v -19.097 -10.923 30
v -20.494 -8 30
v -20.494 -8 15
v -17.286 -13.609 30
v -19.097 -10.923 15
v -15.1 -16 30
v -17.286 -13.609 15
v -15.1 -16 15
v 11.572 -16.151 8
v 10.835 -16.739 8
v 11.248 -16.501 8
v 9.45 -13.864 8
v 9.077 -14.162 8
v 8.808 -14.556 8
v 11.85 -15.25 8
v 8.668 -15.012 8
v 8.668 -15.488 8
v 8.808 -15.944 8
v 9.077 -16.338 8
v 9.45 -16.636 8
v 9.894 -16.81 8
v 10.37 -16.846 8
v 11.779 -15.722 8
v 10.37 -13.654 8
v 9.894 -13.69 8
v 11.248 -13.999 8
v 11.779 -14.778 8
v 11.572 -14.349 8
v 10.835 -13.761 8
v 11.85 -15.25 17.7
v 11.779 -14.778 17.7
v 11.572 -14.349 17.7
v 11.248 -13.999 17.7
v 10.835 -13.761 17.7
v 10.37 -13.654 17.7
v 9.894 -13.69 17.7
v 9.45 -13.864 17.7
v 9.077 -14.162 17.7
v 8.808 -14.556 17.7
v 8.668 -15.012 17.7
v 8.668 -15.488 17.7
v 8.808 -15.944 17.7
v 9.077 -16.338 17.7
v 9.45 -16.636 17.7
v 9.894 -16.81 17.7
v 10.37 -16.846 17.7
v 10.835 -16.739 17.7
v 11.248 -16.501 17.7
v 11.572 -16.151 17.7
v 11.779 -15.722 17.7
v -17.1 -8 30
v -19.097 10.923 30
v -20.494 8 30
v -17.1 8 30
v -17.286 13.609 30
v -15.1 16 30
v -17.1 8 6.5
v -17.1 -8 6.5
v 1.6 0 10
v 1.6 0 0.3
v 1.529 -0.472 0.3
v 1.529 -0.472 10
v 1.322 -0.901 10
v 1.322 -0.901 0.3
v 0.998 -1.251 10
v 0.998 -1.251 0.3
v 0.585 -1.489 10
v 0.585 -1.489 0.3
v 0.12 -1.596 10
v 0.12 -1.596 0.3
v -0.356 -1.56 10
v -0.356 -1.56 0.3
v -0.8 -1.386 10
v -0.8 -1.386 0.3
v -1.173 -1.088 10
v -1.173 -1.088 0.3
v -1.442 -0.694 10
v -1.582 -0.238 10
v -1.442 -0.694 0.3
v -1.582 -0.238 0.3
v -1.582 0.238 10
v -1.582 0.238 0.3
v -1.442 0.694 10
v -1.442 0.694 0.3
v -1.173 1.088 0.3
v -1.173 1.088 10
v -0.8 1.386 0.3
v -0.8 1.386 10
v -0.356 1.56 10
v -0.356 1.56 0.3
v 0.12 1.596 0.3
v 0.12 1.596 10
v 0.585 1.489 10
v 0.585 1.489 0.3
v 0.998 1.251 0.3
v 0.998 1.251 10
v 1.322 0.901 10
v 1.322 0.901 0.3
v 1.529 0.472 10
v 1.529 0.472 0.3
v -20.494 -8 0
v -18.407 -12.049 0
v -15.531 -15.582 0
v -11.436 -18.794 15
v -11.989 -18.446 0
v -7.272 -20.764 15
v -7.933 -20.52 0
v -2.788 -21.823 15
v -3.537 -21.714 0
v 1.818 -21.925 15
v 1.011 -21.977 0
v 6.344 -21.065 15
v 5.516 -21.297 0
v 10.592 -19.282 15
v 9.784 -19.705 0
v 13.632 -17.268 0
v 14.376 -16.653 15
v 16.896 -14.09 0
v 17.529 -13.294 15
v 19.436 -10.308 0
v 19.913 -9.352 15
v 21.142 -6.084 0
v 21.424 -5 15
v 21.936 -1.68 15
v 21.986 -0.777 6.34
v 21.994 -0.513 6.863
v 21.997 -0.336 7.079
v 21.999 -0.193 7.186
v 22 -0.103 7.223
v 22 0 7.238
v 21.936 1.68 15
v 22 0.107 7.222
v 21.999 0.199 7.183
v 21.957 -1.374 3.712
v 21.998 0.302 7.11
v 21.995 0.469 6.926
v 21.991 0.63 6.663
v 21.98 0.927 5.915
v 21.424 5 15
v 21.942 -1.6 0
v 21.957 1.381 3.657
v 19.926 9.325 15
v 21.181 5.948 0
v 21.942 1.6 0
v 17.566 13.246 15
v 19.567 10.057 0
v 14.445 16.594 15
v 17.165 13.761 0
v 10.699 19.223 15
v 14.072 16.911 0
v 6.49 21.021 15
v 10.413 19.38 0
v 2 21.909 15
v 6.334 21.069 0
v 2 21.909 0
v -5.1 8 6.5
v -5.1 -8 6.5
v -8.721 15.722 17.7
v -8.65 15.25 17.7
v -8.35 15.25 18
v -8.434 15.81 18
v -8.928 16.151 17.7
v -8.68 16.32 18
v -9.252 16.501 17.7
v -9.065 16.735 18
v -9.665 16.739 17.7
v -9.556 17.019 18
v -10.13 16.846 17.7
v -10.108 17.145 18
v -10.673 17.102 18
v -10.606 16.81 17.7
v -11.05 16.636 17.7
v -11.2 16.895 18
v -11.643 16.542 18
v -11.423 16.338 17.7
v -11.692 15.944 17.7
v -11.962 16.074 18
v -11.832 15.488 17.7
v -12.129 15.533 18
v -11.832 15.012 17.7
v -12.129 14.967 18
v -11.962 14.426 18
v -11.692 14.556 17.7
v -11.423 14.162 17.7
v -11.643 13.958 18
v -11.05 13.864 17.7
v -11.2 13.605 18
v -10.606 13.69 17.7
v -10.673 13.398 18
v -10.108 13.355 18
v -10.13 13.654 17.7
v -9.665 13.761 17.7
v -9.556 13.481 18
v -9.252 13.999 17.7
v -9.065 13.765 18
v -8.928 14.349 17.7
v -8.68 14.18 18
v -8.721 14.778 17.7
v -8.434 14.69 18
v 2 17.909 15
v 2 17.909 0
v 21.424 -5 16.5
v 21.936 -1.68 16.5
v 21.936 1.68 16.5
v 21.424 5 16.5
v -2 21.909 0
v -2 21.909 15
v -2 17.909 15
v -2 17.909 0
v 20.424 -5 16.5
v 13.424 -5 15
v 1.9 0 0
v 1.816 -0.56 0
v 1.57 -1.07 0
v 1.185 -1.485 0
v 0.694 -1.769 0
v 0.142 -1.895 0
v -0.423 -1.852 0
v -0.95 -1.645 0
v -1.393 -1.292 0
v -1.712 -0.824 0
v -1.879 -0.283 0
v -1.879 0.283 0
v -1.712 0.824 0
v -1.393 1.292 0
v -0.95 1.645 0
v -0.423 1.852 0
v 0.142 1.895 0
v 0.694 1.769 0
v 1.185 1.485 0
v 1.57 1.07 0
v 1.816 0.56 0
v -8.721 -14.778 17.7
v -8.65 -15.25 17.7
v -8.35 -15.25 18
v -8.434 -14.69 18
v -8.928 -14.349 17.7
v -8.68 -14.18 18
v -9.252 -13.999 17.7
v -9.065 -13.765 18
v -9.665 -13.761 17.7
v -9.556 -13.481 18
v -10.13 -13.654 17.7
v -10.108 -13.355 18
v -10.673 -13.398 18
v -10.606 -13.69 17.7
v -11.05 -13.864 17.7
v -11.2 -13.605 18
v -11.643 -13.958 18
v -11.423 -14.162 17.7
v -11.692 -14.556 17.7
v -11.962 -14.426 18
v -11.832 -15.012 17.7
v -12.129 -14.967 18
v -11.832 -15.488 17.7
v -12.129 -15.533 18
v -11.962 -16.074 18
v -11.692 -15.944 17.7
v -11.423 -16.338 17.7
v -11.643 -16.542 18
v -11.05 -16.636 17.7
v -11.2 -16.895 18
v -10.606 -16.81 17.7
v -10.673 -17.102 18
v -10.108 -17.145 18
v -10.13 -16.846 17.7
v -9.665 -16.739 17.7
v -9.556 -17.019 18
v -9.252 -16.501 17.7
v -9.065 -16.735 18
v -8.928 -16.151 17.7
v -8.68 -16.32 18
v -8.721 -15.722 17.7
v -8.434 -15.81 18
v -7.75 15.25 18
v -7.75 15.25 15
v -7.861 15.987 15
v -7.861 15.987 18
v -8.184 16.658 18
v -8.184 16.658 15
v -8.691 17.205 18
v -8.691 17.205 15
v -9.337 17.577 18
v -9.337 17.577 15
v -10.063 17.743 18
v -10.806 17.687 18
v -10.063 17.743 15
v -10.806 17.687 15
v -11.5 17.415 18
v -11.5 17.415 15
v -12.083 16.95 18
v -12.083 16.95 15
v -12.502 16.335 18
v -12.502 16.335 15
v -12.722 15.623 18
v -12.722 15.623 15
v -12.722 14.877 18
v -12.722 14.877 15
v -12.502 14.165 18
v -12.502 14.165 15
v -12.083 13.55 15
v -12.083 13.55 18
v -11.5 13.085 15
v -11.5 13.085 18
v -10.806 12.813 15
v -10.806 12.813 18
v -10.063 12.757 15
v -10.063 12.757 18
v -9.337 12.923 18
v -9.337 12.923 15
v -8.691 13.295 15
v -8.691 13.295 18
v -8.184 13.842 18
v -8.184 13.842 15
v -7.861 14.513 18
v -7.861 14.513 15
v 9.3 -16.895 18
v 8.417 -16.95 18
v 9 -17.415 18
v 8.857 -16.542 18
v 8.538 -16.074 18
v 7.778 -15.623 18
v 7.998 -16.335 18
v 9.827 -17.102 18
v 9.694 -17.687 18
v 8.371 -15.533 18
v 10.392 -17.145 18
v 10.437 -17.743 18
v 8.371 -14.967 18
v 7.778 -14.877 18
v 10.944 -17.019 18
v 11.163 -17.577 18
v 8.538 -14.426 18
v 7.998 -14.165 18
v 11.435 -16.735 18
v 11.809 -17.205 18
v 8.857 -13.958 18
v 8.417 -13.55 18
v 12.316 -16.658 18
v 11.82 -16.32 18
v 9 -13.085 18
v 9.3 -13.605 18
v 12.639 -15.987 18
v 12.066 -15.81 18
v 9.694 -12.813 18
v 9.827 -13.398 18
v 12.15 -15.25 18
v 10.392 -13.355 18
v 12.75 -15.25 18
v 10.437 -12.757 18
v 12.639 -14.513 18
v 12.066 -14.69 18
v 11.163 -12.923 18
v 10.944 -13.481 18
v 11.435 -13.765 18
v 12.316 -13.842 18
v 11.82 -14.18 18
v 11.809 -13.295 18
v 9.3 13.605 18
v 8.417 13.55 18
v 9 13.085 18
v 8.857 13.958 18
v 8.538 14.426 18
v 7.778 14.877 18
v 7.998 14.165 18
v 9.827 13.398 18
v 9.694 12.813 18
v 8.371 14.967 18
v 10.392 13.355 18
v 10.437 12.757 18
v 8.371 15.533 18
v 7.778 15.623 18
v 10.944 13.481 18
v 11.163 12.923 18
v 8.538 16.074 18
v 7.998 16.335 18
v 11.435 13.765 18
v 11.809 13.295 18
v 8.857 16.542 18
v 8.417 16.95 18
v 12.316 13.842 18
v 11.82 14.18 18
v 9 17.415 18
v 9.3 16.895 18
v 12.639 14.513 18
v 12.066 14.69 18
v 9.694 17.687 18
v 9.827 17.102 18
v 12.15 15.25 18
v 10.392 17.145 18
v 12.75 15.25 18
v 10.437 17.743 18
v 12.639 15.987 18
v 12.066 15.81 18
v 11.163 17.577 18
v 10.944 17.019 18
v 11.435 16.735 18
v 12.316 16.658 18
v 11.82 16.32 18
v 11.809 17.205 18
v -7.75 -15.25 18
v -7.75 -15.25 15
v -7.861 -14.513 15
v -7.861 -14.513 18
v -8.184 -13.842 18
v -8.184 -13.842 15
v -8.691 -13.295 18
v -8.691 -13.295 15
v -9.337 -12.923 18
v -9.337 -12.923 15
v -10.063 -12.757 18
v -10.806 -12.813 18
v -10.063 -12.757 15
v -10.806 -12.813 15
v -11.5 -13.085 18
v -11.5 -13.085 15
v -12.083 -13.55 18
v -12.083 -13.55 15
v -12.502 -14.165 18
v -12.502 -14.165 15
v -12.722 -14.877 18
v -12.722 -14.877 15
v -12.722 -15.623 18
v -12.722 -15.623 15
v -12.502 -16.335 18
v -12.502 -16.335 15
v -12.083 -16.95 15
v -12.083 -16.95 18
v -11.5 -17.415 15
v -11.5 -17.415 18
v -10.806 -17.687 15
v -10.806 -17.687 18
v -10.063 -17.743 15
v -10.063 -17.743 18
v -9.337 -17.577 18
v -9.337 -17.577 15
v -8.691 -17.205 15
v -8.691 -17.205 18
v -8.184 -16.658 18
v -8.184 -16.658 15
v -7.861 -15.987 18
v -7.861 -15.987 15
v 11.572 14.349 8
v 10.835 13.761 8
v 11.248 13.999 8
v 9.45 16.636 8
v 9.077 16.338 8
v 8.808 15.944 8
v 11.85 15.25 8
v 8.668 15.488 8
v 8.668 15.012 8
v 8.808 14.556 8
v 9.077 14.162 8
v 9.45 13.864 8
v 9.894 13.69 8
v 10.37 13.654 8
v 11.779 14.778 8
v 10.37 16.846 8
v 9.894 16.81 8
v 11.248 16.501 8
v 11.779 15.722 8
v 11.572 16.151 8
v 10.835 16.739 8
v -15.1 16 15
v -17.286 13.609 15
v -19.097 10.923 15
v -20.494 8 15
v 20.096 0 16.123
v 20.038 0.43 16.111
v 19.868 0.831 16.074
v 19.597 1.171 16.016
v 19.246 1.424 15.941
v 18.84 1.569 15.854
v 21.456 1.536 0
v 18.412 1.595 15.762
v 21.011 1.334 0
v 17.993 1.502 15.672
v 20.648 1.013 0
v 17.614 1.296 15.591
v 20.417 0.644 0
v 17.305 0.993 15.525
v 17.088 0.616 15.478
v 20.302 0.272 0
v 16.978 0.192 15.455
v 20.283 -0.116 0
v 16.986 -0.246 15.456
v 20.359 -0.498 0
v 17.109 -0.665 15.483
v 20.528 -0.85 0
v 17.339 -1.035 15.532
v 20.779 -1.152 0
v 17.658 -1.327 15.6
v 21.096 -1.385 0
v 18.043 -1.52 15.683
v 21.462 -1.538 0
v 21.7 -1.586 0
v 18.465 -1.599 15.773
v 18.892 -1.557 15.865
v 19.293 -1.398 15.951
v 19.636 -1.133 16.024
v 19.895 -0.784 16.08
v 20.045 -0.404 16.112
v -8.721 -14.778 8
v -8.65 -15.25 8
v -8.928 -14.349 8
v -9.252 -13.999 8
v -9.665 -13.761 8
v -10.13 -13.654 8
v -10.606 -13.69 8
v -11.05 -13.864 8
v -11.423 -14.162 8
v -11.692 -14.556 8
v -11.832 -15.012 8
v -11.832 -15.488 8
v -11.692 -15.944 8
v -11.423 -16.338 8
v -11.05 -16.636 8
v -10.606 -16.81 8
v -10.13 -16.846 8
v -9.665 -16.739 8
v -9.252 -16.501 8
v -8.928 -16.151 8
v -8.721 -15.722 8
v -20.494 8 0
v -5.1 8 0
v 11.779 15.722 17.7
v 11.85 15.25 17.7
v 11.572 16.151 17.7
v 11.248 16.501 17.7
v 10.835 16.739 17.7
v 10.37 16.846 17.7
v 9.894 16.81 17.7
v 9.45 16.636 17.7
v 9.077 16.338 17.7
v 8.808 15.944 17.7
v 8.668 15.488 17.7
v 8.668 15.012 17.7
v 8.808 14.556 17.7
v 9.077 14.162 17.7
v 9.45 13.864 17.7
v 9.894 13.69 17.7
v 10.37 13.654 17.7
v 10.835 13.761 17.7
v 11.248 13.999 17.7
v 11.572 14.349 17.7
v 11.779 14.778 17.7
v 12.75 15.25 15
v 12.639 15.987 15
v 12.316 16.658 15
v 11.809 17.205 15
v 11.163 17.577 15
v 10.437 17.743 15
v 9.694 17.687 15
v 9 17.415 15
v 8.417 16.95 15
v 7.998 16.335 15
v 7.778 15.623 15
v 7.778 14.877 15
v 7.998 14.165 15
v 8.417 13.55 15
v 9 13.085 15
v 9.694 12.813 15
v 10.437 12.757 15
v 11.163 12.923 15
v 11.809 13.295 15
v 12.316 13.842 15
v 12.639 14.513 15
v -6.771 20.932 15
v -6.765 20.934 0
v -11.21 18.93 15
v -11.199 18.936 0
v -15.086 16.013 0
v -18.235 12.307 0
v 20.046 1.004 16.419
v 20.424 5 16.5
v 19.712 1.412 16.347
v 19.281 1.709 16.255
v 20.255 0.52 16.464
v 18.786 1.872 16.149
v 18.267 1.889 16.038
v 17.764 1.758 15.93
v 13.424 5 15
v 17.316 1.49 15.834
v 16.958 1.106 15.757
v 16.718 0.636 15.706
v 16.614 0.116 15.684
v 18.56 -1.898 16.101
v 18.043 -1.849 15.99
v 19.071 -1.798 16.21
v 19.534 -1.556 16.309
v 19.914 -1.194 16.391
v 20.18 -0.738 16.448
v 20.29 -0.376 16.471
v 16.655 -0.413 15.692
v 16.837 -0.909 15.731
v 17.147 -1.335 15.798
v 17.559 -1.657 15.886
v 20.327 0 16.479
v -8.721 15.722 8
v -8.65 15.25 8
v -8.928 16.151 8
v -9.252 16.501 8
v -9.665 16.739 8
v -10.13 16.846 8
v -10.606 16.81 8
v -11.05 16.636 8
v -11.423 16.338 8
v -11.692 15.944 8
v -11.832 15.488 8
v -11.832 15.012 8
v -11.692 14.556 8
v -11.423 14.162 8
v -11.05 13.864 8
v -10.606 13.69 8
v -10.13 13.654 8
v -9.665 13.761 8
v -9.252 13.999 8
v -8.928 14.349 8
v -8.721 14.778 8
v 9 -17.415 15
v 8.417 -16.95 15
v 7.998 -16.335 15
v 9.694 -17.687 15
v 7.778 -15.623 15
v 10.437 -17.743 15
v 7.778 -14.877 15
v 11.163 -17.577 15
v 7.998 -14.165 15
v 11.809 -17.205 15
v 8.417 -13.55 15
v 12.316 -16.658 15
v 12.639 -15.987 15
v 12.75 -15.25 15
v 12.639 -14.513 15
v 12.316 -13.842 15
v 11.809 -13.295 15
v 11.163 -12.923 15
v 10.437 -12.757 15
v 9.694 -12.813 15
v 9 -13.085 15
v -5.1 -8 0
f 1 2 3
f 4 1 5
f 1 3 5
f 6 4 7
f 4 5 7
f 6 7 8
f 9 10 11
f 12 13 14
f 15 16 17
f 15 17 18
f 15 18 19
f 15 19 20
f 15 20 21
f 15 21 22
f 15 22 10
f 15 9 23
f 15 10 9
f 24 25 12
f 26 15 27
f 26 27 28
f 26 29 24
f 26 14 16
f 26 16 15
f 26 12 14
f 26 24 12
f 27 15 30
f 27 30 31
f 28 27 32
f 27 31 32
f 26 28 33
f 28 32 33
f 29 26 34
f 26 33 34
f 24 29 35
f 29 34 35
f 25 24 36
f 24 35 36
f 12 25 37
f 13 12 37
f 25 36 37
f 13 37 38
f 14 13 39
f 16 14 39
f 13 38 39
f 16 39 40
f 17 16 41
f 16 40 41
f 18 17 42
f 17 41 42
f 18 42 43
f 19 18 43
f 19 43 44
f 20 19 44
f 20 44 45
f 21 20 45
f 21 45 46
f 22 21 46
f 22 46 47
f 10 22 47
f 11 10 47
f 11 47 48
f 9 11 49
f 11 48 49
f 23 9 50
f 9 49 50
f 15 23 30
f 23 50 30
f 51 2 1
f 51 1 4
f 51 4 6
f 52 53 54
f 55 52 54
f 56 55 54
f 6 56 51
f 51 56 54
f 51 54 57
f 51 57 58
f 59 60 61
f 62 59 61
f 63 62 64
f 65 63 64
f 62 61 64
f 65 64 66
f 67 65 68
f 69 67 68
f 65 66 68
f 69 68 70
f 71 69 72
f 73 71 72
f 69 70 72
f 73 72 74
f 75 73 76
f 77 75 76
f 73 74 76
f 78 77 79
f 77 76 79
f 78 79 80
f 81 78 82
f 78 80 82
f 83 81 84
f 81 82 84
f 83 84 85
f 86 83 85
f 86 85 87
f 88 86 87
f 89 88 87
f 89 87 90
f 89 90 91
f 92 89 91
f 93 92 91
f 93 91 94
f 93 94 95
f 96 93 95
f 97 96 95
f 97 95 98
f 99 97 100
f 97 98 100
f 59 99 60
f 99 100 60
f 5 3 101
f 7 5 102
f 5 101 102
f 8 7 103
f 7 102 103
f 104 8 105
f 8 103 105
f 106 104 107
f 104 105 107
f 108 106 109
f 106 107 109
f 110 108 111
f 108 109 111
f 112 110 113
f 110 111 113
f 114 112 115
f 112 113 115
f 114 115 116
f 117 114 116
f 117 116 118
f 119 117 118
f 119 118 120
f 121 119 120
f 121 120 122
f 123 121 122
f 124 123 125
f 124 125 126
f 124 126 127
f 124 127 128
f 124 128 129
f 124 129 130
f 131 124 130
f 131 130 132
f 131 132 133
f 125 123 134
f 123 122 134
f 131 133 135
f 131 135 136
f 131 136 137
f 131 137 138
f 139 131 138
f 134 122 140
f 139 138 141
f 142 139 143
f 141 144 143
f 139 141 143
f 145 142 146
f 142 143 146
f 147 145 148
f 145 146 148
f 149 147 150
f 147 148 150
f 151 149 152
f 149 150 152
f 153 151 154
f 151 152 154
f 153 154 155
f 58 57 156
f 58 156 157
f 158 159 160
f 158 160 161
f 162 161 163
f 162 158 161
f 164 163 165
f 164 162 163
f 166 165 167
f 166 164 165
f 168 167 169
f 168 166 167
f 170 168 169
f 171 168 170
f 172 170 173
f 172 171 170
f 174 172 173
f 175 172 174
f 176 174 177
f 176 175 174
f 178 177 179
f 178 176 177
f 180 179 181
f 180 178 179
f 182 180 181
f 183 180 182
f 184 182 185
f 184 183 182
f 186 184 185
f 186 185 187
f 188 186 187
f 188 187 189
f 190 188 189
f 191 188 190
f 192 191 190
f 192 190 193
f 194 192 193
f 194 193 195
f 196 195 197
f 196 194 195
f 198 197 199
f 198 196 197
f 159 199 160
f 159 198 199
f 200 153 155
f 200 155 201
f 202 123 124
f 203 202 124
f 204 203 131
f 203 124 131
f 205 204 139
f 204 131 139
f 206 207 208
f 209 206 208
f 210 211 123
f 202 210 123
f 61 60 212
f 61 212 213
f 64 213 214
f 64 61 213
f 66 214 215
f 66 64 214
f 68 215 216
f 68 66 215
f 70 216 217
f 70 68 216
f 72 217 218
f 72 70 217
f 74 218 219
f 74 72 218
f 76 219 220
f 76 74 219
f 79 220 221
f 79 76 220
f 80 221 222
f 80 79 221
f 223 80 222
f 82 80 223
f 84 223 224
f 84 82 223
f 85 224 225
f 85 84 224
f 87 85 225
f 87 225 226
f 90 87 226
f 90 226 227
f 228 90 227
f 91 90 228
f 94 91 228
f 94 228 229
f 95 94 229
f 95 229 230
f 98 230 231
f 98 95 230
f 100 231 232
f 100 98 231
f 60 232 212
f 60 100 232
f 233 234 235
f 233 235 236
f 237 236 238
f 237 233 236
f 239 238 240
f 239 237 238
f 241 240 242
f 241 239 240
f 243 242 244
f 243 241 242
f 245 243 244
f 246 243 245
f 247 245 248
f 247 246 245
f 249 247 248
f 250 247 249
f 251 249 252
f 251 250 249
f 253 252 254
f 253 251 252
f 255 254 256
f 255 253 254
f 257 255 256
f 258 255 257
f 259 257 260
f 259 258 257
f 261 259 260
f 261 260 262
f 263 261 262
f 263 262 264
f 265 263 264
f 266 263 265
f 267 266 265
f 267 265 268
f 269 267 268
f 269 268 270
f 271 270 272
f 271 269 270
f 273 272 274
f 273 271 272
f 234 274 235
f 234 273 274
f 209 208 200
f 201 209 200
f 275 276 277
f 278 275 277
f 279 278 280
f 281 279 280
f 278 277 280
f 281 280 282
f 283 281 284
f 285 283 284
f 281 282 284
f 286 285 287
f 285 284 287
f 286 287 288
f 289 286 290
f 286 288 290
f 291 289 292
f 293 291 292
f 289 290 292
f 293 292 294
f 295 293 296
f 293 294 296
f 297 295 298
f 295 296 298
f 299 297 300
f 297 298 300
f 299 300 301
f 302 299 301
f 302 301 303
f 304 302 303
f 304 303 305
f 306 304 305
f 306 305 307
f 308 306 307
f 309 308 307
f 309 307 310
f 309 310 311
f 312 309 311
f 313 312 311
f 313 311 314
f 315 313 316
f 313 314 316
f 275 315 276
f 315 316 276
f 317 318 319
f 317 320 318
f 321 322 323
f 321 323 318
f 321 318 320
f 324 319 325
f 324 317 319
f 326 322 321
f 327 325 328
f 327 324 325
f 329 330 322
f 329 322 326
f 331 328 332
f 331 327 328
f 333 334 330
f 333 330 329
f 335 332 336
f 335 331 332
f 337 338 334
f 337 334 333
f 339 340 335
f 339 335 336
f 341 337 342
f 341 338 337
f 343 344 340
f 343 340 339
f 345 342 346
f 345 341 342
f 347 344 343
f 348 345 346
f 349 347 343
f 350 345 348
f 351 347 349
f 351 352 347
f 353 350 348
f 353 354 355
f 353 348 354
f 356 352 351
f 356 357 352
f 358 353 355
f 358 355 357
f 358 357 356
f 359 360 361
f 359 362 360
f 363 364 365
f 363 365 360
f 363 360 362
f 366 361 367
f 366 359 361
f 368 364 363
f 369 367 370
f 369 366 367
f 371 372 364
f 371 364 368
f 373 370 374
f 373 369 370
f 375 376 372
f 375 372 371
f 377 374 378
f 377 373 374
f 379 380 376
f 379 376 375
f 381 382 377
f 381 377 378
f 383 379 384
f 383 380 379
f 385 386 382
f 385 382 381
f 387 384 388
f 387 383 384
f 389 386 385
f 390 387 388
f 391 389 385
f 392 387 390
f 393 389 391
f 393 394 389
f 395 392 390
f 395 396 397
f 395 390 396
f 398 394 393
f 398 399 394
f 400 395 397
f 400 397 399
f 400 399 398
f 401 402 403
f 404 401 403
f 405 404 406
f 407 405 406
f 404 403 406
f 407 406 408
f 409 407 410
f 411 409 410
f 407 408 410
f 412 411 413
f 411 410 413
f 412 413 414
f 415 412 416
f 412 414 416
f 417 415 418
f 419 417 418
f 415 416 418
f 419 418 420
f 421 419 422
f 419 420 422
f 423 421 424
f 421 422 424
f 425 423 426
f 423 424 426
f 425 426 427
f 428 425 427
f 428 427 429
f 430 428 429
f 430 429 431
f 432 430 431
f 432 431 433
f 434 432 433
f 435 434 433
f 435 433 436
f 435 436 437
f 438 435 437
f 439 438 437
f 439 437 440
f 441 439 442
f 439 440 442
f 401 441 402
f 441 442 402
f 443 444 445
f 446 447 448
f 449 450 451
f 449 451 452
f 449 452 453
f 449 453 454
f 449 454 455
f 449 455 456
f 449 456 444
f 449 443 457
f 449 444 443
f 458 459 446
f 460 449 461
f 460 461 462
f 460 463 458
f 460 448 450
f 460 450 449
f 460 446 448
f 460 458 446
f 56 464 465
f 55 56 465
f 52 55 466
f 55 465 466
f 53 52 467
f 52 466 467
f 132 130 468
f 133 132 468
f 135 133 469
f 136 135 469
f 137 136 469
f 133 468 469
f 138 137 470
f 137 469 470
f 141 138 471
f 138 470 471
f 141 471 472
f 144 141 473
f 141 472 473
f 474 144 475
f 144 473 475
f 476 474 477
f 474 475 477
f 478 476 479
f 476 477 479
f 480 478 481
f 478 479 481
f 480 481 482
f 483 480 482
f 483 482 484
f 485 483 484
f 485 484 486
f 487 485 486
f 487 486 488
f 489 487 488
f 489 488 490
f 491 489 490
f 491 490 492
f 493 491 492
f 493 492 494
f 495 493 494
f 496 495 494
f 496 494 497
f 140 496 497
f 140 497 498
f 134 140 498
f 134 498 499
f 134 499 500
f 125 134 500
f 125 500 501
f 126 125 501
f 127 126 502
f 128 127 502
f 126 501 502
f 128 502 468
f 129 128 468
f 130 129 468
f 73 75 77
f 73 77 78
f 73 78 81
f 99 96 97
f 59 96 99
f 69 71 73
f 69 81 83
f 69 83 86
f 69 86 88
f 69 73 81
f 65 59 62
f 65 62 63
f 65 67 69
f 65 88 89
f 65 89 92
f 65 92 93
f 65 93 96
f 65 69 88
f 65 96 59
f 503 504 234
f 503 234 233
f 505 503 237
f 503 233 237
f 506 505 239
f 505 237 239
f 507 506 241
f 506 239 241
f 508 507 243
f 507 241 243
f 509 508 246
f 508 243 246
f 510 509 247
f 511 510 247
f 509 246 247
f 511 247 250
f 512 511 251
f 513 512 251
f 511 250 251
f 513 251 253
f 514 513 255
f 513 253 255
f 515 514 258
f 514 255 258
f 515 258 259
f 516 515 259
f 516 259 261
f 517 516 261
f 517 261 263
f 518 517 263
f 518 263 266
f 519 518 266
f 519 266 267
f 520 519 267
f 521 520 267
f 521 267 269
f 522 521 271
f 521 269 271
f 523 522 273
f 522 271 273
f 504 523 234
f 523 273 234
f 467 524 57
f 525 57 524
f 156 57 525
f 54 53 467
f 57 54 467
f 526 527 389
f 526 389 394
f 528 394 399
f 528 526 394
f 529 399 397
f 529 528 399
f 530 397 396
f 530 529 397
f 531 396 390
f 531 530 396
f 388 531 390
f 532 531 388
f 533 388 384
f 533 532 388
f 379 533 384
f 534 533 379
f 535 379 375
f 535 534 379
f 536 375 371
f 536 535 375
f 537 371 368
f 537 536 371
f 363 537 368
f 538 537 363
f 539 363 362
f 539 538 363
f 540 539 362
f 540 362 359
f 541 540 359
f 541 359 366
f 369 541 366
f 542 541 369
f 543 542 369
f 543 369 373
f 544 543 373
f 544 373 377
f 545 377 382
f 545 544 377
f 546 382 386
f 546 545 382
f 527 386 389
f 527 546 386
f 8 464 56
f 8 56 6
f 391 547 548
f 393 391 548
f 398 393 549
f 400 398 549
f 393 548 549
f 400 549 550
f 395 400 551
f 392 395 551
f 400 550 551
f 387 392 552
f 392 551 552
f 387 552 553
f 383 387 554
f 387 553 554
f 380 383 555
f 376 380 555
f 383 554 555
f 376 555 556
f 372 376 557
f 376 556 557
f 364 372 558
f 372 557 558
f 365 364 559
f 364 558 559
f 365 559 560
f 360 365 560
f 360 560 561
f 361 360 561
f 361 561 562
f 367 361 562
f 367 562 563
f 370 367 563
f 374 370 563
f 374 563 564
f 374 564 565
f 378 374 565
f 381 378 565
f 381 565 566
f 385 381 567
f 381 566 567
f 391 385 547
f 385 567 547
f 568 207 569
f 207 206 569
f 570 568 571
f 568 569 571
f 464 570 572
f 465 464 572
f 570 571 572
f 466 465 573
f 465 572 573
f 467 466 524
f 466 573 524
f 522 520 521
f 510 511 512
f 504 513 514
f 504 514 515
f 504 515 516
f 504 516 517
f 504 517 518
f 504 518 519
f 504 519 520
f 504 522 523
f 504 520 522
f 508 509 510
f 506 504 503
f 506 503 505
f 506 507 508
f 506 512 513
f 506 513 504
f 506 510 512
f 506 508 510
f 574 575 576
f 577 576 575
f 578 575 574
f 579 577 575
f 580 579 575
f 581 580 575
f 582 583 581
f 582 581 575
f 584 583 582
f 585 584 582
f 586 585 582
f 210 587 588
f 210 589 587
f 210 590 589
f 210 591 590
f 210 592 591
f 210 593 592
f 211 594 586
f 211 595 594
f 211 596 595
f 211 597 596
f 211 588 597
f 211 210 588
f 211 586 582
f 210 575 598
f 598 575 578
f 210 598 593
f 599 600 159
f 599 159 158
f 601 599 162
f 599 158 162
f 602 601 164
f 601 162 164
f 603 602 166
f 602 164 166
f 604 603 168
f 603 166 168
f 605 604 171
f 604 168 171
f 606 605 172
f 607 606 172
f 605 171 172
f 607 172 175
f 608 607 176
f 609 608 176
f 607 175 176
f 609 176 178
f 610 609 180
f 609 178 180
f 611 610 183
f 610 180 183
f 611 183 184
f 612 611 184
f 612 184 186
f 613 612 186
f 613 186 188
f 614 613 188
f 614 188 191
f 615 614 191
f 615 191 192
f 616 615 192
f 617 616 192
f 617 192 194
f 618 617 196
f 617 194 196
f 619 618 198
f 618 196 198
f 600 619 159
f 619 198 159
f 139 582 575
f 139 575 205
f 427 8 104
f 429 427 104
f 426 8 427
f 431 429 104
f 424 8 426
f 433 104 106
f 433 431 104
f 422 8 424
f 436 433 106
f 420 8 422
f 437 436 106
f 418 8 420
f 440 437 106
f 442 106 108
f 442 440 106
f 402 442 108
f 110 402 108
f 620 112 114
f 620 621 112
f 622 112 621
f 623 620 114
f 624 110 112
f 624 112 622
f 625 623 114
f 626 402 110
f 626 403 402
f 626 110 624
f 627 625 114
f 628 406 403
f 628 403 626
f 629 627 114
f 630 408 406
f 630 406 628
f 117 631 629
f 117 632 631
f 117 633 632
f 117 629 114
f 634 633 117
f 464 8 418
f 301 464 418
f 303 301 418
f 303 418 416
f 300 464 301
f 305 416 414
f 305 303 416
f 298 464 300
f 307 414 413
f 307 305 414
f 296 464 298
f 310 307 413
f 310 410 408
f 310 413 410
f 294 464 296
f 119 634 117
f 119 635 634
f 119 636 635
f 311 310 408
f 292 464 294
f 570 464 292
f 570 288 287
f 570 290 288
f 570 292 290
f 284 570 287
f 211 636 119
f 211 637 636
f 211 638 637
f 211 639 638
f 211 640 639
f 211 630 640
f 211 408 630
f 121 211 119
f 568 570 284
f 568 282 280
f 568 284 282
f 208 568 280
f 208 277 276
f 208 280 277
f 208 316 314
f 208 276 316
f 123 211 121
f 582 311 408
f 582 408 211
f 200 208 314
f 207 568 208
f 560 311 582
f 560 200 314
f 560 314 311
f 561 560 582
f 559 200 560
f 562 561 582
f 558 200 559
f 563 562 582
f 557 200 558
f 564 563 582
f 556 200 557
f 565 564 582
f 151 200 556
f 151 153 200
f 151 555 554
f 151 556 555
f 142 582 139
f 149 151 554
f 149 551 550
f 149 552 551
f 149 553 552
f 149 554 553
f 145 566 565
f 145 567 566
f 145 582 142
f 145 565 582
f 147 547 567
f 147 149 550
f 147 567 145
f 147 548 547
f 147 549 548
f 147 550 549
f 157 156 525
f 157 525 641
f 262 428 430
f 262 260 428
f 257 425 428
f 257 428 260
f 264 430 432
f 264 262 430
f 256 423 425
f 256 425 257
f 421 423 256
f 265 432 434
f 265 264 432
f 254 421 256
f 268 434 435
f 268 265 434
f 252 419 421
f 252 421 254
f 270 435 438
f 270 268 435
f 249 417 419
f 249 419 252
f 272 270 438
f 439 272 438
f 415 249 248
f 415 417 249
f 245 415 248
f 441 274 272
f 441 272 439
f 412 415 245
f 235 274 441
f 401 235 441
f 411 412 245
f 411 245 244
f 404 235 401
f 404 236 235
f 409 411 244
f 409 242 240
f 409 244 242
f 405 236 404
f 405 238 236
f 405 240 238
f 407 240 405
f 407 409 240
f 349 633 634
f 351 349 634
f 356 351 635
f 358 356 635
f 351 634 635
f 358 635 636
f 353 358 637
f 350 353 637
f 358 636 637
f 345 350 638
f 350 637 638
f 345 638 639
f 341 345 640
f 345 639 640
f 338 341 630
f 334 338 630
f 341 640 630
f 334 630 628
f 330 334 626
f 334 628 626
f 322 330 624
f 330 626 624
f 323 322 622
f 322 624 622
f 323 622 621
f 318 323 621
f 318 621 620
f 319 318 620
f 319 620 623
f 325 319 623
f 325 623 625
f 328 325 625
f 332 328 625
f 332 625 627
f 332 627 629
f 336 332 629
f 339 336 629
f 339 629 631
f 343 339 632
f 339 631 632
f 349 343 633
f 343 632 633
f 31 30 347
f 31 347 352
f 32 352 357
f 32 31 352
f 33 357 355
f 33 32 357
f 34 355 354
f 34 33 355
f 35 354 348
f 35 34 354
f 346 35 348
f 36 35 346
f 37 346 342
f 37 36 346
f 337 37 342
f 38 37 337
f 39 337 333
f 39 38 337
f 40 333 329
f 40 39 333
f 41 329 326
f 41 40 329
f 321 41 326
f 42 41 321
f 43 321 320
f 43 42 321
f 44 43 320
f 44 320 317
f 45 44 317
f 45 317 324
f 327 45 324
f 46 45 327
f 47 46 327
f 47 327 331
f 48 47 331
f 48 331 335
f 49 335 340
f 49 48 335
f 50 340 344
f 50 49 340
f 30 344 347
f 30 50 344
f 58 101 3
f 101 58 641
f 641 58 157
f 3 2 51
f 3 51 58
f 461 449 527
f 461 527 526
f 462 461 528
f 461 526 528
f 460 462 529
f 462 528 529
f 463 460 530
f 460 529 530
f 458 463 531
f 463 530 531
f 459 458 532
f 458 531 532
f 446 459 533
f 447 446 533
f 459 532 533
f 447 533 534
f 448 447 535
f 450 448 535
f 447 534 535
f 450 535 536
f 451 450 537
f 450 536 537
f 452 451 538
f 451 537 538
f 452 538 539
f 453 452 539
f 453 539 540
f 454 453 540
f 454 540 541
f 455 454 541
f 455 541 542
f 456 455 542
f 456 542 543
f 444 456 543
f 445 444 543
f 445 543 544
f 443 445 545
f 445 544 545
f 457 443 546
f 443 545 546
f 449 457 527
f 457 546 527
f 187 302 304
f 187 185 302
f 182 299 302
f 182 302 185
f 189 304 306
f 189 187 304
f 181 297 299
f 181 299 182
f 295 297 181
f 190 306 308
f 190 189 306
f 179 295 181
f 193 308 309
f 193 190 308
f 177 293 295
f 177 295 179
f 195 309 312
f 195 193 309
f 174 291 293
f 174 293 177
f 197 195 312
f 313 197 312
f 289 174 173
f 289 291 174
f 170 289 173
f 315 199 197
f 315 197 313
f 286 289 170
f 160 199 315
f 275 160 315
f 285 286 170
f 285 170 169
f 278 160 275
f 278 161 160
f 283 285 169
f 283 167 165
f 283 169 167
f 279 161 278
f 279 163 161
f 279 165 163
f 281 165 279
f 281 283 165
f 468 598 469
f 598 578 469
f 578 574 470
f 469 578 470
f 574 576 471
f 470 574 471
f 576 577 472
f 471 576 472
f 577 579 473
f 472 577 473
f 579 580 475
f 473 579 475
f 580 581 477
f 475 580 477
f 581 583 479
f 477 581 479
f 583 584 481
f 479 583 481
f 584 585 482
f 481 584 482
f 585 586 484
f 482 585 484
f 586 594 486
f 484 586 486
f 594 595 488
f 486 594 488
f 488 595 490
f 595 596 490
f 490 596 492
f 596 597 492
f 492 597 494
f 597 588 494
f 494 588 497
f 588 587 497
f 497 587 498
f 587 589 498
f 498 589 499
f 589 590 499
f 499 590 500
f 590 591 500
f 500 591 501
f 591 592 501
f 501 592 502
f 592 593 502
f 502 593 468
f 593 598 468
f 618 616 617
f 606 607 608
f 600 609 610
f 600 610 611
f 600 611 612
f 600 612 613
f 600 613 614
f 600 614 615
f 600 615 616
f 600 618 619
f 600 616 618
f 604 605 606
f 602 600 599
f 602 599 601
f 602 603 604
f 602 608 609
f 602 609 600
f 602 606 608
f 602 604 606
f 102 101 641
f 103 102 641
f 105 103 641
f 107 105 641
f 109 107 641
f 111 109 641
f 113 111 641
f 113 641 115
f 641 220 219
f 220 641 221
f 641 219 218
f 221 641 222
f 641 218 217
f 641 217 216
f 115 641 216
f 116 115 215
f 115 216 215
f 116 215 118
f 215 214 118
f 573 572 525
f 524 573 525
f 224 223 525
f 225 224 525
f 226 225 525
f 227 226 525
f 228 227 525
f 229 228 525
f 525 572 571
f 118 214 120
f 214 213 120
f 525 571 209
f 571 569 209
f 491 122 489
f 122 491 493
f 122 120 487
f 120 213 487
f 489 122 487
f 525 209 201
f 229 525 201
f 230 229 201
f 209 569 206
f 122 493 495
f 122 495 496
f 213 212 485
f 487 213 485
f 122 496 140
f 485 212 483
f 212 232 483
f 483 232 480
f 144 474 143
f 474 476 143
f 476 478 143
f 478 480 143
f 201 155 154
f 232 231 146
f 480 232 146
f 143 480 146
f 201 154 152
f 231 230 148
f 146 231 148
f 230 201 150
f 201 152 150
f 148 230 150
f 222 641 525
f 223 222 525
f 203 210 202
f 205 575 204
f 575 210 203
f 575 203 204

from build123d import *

# Parameters (mm, degrees)
SKETCH_R        = 22
PAD_DEPTH       = 15
PAD001_DEPTH    = 15
POCKET_DEPTH    = 30.001
SKETCH003_R     = 2.5
PAD002_DEPTH    = 3
SKETCH004_R     = 1.6
POCKET001_DEPTH = 10
POCKET002_DEPTH = 15.001
SKETCH006_W     = 16
SKETCH006_H     = 6.5
POCKET003_DEPTH = 12
PAD003_DEPTH    = 1.5
PAD004_DEPTH    = 10
SKETCH009_R     = 1.6
POCKET004_DEPTH = 16.4648979005
SKETCH010_R     = 1.6
POCKET005_DEPTH = 10
CHAMFER_SIZE    = 0.3
CHAMFER001_SIZE = 0.3
CHAMFER002_SIZE = 0.3
CHAMFER003_SIZE = 0.3
CHAMFER004_SIZE = 0.3
CHAMFER005_SIZE = 0.3


with BuildPart() as part:
    # Sketch → Pad (new body)
    with BuildSketch(Plane.XY):
        Circle(SKETCH_R)
    extrude(amount=PAD_DEPTH)

    # Sketch001 → Pad001 (new body)
    with BuildSketch(Plane.XY.offset(15)):
        with BuildLine():
            ThreePointArc((-15.0996688705, 16), (-22, 0), (-15.0996688705, -16))
            Line((-15.0996688705, 16), (-15.0996688705, -16))
        make_face()
    extrude(amount=PAD001_DEPTH)

    # Sketch002 → Pocket (cut, through all)
    with BuildSketch(Plane.XY.offset(30)):
        with BuildLine():
            ThreePointArc((-20.4939015319, 8), (-22, 0), (-20.4939015319, -8))
            Line((-20.4939015319, -8), (-17.0996688705, -8))
            Line((-17.0996688705, 8), (-17.0996688705, -8))
            Line((-20.4939015319, 8), (-17.0996688705, 8))
        make_face()
    extrude(amount=-POCKET_DEPTH, mode=Mode.SUBTRACT)

    # Sketch003 → Pad002 (new body)
    with BuildSketch(Plane.XY.offset(15)):
        with Locations((-10.25, 15.25)):
            Circle(SKETCH003_R)
        with Locations((10.25, 15.25)):
            Circle(SKETCH003_R)
        with Locations((-10.25, -15.25)):
            Circle(SKETCH003_R)
        with Locations((10.25, -15.25)):
            Circle(SKETCH003_R)
    extrude(amount=PAD002_DEPTH)

    # Sketch004 → Pocket001 (cut)
    with BuildSketch(Plane.XY.offset(18)):
        with Locations((-10.25, 15.25)):
            Circle(SKETCH004_R)
        with Locations((10.25, 15.25)):
            Circle(SKETCH004_R)
        with Locations((-10.25, -15.25)):
            Circle(SKETCH004_R)
        with Locations((10.25, -15.25)):
            Circle(SKETCH004_R)
    extrude(amount=-POCKET001_DEPTH, mode=Mode.SUBTRACT)

    # Sketch005 → Pocket002 (cut, through all)
    with BuildSketch(Plane.XY.offset(15)):
        with BuildLine():
            ThreePointArc((2, 21.9089023002), (0, 22), (-2, 21.9089023002))
            Line((-2, 21.9089023002), (-2, 17.9089023002))
            Line((-2, 17.9089023002), (2, 17.9089023002))
            Line((2, 21.9089023002), (2, 17.9089023002))
        make_face()
    extrude(amount=-POCKET002_DEPTH, mode=Mode.SUBTRACT)

    # Sketch006 → Pocket003 (cut)
    with BuildSketch(Plane(origin=(-17.0996688705, 0, 0), x_dir=(0, -1, 0), z_dir=(-1, 0, 0))):
        with Locations((0, 3.25)):
            Rectangle(SKETCH006_W, SKETCH006_H)
    extrude(amount=-POCKET003_DEPTH, mode=Mode.SUBTRACT)

    # Sketch007 → Pad003 (new body)
    with BuildSketch(Plane.XY.offset(15)):
        with BuildLine():
            ThreePointArc((21.4242852856, -5), (22, 0), (21.4242852856, 5))
            Line((21.4242852856, 5), (20.4242852856, 5))
            Line((20.4242852856, 5), (20.4242852856, -5))
            Line((20.4242852856, -5), (21.4242852856, -5))
        make_face()
    extrude(amount=PAD003_DEPTH)

    # Sketch008 → Pad004 (new body)
    with BuildSketch(Plane.XZ.offset(5)):
        Polygon((20.4242852856, 16.5), (13.4242852856, 15), (20.4242852856, 15), align=None)
    extrude(amount=-PAD004_DEPTH)

    # Sketch009 → Pocket004 (cut, through all)
    with BuildSketch(Plane(origin=(-2.4838118655, 0, 11.591122039), x_dir=(0.9778024141, 0, 0.2095290887), z_dir=(-0.2095290887, 0, 0.9778024141))):
        with Locations((21.4281454222, 0)):
            Circle(SKETCH009_R)
    extrude(amount=-POCKET004_DEPTH, mode=Mode.SUBTRACT)

    # Sketch010 → Pocket005 (cut)
    with BuildSketch(Plane(origin=(0, 0, 0), x_dir=(1, 0, 0), z_dir=(0, 0, -1))):
        Circle(SKETCH010_R)
    extrude(amount=-POCKET005_DEPTH, mode=Mode.SUBTRACT)

    # Chamfer
    chamfer_edges = [part.edges().sort_by_distance(p)[0] for p in [
        (8.65, 15.25, 18),
    ]]
    chamfer(chamfer_edges, length=CHAMFER_SIZE)

    # Chamfer001
    chamfer001_edges = [part.edges().sort_by_distance(p)[0] for p in [
        (-11.85, 15.25, 18),
    ]]
    chamfer(chamfer001_edges, length=CHAMFER001_SIZE)

    # Chamfer002
    chamfer002_edges = [part.edges().sort_by_distance(p)[0] for p in [
        (-11.85, -15.25, 18),
    ]]
    chamfer(chamfer002_edges, length=CHAMFER002_SIZE)

    # Chamfer003
    chamfer003_edges = [part.edges().sort_by_distance(p)[0] for p in [
        (8.65, -15.25, 18),
    ]]
    chamfer(chamfer003_edges, length=CHAMFER003_SIZE)

    # Chamfer004
    chamfer004_edges = [part.edges().sort_by_distance(p)[0] for p in [
        (16.904197, 0, 15.745695),
    ]]
    chamfer(chamfer004_edges, length=CHAMFER004_SIZE)

    # Chamfer005
    chamfer005_edges = [part.edges().sort_by_distance(p)[0] for p in [
        (-1.6, 0, 0),
    ]]
    chamfer(chamfer005_edges, length=CHAMFER005_SIZE)


solid = part.part
